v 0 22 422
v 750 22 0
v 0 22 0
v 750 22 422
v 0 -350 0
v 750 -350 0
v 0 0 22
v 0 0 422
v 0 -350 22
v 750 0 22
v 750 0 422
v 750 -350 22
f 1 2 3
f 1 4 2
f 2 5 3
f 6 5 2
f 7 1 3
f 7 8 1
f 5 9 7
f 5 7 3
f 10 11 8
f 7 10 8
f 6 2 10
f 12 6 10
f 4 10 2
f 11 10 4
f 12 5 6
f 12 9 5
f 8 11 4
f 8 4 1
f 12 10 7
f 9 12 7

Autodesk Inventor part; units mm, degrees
ref_plane "YZ Plane" through (0, 0, 0) normal (1, 0, 0) x (0, 1, 0)
ref_plane "XZ Plane" through (0, 0, 0) normal (0, 1, 0) x (-1, 0, 0)
sketch "Skizze1" plane through (0, 0, 0) normal (0, 1, 0) x (-1, 0, 0)
  line L0 (0, 0) -> (-750, 0)
  line L1 (-750, 0) -> (-750, 422)
  line L2 (-750, 422) -> (0, 422)
  line L3 (0, 422) -> (0, 0)
  dimension "d0" = 750
  dimension "d1" = 422
extrude "Back_Back" add sketch "Skizze1" along normal blind 22
sketch "Skizze2" plane through (0, 0, 0) normal (0, -1, 0) x (1, 0, 0)
  line L0 (750, 422) -> (750, 0) projected
  line L1 (0, 0) -> (750, 0)
  line L2 (750, 0) -> (750, 22)
  line L3 (750, 22) -> (0, 22)
  line L4 (0, 22) -> (0, 0)
  dimension "d4" = 22
extrude "Back_Down" add sketch "Skizze2" along normal blind 350
sketch "Sketch_Footprint_Magnet&Robot" plane through (0, 0, 22) normal (0, 0, 1) x (1, 0, 0)
  line L0 (0, -350) -> (0, 22) construction
  line L1 (750, -350) -> (0, -350) construction
  line L2 (0, -200) -> (750, -200) construction
  line L3 (12, -45) -> (315, -45)
  line L4 (315, -45) -> (315, -355)
  line L5 (315, -355) -> (12, -355)
  line L6 (12, -355) -> (12, -45)
  line L7 (12, -45) -> (315, -355) construction
  line L8 (315, -45) -> (12, -355) construction
  line L9 (0, -100) -> (12, -100)
  line L10 (12, -100) -> (12, -300)
  line L11 (12, -300) -> (0, -300)
  line L12 (0, -300) -> (0, -100)
  line L13 (315, -100) -> (327, -100)
  line L14 (327, -100) -> (327, -300)
  line L15 (327, -300) -> (315, -300)
  line L16 (315, -300) -> (315, -100)
  line L17 (545, -265) -> (675, -265)
  line L18 (675, -265) -> (675, -135)
  line L19 (675, -135) -> (545, -135)
  line L20 (545, -135) -> (545, -265)
  line L21 (545, -265) -> (675, -135) construction
  line L22 (675, -265) -> (545, -135) construction
  line L23 (750, 0) -> (750, -350) projected
  line L24 (0, 0) -> (750, 0) projected
  point P0 (163.5, -200)
  point P1 (327, -200)
  point P2 (610, -200)
  dimension "d15" = 150
  dimension "d16" = 303
  dimension "d17" = 310
  dimension "d18" = 12
  dimension "d19" = 200
  dimension "d20" = 130
  dimension "d21" = 140
  dimension "d56" = 200
sketch "Sketch_ReferenceBoard" plane through (0, 0, 0) normal (0, -1, 0) x (1, 0, 0)
  line L0 (750, 422) -> (330, 422)
  line L1 (330, 422) -> (330, 125)
  line L2 (330, 125) -> (750, 125)
  line L3 (750, 125) -> (750, 422)
  line L4 (330, 446) -> (330, 125)
  line L5 (345, 330) -> (345, 130) construction
  line L6 (345, 130) -> (645, 130) construction
  line L7 (345, 208) -> (345, 130)
  line L8 (610, 22) -> (610, 130) construction
  line L9 (675, 22) -> (675, 130) construction
  line L10 (750, 422) -> (750, 22) construction
  line L11 (330, 360) -> (750, 360) construction
  line L12 (685, 422) -> (685, 125) construction
  line L13 (345, 400) -> (425, 400)
  line L14 (425, 400) -> (425, 320)
  line L15 (425, 320) -> (345, 320)
  line L16 (345, 320) -> (345, 400)
  line L17 (345, 400) -> (425, 320) construction
  line L18 (425, 400) -> (345, 320) construction
  line L19 (545, 400) -> (625, 400)
  line L20 (625, 400) -> (625, 320)
  line L21 (625, 320) -> (545, 320)
  line L22 (545, 320) -> (545, 400)
  line L23 (545, 400) -> (625, 320) construction
  line L24 (625, 400) -> (545, 320) construction
  line L25 (645, 220) -> (725, 220)
  line L26 (725, 220) -> (725, 300)
  line L27 (725, 300) -> (645, 300)
  line L28 (645, 300) -> (645, 220)
  line L29 (645, 220) -> (725, 300) construction
  line L30 (725, 220) -> (645, 300) construction
  line L31 (645, 130) -> (725, 130)
  line L32 (725, 130) -> (725, 210)
  line L33 (725, 210) -> (645, 210)
  line L34 (645, 210) -> (645, 130)
  line L35 (645, 130) -> (725, 210) construction
  line L36 (725, 130) -> (645, 210) construction
  line L37 (485, 303.4315) -> (541.5685, 360)
  line L38 (541.5685, 360) -> (485, 416.5685)
  line L39 (485, 416.5685) -> (428.4315, 360)
  line L40 (428.4315, 360) -> (485, 303.4315)
  line L41 (485, 303.4315) -> (485, 416.5685) construction
  line L42 (541.5685, 360) -> (428.4315, 360) construction
  line L43 (685, 303.4315) -> (741.5685, 360)
  line L44 (741.5685, 360) -> (685, 416.5685)
  line L45 (685, 416.5685) -> (628.4315, 360)
  line L46 (628.4315, 360) -> (685, 303.4315)
  line L47 (685, 303.4315) -> (685, 416.5685) construction
  line L48 (741.5685, 360) -> (628.4315, 360) construction
  point P0 (0, 0)
  point P1 (163.5, 22)
  point P2 (685, 360)
  point P3 (585, 360)
  point P4 (485, 360)
  point P5 (385, 360)
  point P6 (685, 260)
  point P7 (685, 170)
  dimension "d7" = 297
  dimension "d8" = 420
  dimension "d24" = 330
  dimension "d25" = 75
  dimension "d26" = 108
  dimension "d28" = 55
  dimension "d29" = 100
  dimension "d30" = 100
  dimension "d31" = 100
  dimension "d32" = 235
  dimension "d33" = 100
  dimension "d34" = 90
  dimension "d35" = 80
  dimension "d36" = 80
  dimension "d37" = 45
ref_plane "plane_id6" through (0, -60, 0) normal (0, -1, 0) x (1, 0, 0)
sketch "Sketch_RefrenceBoard_id6" plane through (0, -60, 0) normal (0, -1, 0) x (1, 0, 0)
  line L0 (405, 138.5685) -> (461.5685, 82)
  line L1 (461.5685, 82) -> (405, 25.4315)
  line L2 (405, 25.4315) -> (348.4315, 82)
  line L3 (348.4315, 82) -> (405, 138.5685)
  line L4 (0, 22) -> (750, 22) construction
  line L5 (405, 138.5685) -> (405, 25.4315) construction
  line L6 (348.4315, 82) -> (461.5685, 82) construction
  point P0 (0, 0)
  point P1 (405, 82)
  point P2 (345, 130)
  point P3 (405, 82)
  dimension "d40" = 45
  dimension "d41" = 80
  dimension "d42" = 60
  dimension "d43" = 60
  dimension "d45" = 3.4315
  dimension "d46" = 3.4315
sketch "Sketch_Magnet_Back" plane through (0, 0, 0) normal (0, -1, 0) x (1, 0, 0)
  line L0 (318, 369.7147) -> (318, 209.7147)
  line L1 (12, 209.7147) -> (12, 369.7147)
  line L2 (12, 363) -> (318, 363)
  line L3 (318, 363) -> (318, 53)
  line L4 (318, 53) -> (12, 53)
  line L5 (12, 53) -> (12, 363)
  line L6 (12, 121.0397) -> (0, 121.0397)
  line L7 (0, 121.0397) -> (0, 22)
  line L8 (0, 22) -> (12, 22)
  line L9 (12, 22) -> (12, 121.0397)
  line L10 (318, 121.0397) -> (330, 121.0397)
  line L11 (330, 121.0397) -> (330, 22)
  line L12 (330, 22) -> (318, 22)
  line L13 (318, 22) -> (318, 121.0397)
  line L14 (750, 22) -> (0, 22) construction
  line L15 (0, 22) -> (0, 0) construction
  line L16 (12, 128) -> (318, 128) construction
  line L17 (318, 128) -> (318, 288) construction
  line L18 (318, 288) -> (12, 288) construction
  line L19 (12, 288) -> (12, 128) construction
  line L20 (12, 128) -> (318, 288) construction
  line L21 (318, 128) -> (12, 288) construction
  point P0 (318, 208)
  point P1 (165, 208)
  point P2 (12, 208)
  point P3 (12, 208)
  point P4 (165, 128)
  point P5 (165, 288)
  point P6 (345, 130)
  dimension "d47" = 306
  dimension "d48" = 12
  dimension "d51" = 186
  dimension "d52" = 310
  dimension "d53" = 160
  dimension "d54" = 180
  dimension "d55" = 78
properties part number "Referenzboard"
